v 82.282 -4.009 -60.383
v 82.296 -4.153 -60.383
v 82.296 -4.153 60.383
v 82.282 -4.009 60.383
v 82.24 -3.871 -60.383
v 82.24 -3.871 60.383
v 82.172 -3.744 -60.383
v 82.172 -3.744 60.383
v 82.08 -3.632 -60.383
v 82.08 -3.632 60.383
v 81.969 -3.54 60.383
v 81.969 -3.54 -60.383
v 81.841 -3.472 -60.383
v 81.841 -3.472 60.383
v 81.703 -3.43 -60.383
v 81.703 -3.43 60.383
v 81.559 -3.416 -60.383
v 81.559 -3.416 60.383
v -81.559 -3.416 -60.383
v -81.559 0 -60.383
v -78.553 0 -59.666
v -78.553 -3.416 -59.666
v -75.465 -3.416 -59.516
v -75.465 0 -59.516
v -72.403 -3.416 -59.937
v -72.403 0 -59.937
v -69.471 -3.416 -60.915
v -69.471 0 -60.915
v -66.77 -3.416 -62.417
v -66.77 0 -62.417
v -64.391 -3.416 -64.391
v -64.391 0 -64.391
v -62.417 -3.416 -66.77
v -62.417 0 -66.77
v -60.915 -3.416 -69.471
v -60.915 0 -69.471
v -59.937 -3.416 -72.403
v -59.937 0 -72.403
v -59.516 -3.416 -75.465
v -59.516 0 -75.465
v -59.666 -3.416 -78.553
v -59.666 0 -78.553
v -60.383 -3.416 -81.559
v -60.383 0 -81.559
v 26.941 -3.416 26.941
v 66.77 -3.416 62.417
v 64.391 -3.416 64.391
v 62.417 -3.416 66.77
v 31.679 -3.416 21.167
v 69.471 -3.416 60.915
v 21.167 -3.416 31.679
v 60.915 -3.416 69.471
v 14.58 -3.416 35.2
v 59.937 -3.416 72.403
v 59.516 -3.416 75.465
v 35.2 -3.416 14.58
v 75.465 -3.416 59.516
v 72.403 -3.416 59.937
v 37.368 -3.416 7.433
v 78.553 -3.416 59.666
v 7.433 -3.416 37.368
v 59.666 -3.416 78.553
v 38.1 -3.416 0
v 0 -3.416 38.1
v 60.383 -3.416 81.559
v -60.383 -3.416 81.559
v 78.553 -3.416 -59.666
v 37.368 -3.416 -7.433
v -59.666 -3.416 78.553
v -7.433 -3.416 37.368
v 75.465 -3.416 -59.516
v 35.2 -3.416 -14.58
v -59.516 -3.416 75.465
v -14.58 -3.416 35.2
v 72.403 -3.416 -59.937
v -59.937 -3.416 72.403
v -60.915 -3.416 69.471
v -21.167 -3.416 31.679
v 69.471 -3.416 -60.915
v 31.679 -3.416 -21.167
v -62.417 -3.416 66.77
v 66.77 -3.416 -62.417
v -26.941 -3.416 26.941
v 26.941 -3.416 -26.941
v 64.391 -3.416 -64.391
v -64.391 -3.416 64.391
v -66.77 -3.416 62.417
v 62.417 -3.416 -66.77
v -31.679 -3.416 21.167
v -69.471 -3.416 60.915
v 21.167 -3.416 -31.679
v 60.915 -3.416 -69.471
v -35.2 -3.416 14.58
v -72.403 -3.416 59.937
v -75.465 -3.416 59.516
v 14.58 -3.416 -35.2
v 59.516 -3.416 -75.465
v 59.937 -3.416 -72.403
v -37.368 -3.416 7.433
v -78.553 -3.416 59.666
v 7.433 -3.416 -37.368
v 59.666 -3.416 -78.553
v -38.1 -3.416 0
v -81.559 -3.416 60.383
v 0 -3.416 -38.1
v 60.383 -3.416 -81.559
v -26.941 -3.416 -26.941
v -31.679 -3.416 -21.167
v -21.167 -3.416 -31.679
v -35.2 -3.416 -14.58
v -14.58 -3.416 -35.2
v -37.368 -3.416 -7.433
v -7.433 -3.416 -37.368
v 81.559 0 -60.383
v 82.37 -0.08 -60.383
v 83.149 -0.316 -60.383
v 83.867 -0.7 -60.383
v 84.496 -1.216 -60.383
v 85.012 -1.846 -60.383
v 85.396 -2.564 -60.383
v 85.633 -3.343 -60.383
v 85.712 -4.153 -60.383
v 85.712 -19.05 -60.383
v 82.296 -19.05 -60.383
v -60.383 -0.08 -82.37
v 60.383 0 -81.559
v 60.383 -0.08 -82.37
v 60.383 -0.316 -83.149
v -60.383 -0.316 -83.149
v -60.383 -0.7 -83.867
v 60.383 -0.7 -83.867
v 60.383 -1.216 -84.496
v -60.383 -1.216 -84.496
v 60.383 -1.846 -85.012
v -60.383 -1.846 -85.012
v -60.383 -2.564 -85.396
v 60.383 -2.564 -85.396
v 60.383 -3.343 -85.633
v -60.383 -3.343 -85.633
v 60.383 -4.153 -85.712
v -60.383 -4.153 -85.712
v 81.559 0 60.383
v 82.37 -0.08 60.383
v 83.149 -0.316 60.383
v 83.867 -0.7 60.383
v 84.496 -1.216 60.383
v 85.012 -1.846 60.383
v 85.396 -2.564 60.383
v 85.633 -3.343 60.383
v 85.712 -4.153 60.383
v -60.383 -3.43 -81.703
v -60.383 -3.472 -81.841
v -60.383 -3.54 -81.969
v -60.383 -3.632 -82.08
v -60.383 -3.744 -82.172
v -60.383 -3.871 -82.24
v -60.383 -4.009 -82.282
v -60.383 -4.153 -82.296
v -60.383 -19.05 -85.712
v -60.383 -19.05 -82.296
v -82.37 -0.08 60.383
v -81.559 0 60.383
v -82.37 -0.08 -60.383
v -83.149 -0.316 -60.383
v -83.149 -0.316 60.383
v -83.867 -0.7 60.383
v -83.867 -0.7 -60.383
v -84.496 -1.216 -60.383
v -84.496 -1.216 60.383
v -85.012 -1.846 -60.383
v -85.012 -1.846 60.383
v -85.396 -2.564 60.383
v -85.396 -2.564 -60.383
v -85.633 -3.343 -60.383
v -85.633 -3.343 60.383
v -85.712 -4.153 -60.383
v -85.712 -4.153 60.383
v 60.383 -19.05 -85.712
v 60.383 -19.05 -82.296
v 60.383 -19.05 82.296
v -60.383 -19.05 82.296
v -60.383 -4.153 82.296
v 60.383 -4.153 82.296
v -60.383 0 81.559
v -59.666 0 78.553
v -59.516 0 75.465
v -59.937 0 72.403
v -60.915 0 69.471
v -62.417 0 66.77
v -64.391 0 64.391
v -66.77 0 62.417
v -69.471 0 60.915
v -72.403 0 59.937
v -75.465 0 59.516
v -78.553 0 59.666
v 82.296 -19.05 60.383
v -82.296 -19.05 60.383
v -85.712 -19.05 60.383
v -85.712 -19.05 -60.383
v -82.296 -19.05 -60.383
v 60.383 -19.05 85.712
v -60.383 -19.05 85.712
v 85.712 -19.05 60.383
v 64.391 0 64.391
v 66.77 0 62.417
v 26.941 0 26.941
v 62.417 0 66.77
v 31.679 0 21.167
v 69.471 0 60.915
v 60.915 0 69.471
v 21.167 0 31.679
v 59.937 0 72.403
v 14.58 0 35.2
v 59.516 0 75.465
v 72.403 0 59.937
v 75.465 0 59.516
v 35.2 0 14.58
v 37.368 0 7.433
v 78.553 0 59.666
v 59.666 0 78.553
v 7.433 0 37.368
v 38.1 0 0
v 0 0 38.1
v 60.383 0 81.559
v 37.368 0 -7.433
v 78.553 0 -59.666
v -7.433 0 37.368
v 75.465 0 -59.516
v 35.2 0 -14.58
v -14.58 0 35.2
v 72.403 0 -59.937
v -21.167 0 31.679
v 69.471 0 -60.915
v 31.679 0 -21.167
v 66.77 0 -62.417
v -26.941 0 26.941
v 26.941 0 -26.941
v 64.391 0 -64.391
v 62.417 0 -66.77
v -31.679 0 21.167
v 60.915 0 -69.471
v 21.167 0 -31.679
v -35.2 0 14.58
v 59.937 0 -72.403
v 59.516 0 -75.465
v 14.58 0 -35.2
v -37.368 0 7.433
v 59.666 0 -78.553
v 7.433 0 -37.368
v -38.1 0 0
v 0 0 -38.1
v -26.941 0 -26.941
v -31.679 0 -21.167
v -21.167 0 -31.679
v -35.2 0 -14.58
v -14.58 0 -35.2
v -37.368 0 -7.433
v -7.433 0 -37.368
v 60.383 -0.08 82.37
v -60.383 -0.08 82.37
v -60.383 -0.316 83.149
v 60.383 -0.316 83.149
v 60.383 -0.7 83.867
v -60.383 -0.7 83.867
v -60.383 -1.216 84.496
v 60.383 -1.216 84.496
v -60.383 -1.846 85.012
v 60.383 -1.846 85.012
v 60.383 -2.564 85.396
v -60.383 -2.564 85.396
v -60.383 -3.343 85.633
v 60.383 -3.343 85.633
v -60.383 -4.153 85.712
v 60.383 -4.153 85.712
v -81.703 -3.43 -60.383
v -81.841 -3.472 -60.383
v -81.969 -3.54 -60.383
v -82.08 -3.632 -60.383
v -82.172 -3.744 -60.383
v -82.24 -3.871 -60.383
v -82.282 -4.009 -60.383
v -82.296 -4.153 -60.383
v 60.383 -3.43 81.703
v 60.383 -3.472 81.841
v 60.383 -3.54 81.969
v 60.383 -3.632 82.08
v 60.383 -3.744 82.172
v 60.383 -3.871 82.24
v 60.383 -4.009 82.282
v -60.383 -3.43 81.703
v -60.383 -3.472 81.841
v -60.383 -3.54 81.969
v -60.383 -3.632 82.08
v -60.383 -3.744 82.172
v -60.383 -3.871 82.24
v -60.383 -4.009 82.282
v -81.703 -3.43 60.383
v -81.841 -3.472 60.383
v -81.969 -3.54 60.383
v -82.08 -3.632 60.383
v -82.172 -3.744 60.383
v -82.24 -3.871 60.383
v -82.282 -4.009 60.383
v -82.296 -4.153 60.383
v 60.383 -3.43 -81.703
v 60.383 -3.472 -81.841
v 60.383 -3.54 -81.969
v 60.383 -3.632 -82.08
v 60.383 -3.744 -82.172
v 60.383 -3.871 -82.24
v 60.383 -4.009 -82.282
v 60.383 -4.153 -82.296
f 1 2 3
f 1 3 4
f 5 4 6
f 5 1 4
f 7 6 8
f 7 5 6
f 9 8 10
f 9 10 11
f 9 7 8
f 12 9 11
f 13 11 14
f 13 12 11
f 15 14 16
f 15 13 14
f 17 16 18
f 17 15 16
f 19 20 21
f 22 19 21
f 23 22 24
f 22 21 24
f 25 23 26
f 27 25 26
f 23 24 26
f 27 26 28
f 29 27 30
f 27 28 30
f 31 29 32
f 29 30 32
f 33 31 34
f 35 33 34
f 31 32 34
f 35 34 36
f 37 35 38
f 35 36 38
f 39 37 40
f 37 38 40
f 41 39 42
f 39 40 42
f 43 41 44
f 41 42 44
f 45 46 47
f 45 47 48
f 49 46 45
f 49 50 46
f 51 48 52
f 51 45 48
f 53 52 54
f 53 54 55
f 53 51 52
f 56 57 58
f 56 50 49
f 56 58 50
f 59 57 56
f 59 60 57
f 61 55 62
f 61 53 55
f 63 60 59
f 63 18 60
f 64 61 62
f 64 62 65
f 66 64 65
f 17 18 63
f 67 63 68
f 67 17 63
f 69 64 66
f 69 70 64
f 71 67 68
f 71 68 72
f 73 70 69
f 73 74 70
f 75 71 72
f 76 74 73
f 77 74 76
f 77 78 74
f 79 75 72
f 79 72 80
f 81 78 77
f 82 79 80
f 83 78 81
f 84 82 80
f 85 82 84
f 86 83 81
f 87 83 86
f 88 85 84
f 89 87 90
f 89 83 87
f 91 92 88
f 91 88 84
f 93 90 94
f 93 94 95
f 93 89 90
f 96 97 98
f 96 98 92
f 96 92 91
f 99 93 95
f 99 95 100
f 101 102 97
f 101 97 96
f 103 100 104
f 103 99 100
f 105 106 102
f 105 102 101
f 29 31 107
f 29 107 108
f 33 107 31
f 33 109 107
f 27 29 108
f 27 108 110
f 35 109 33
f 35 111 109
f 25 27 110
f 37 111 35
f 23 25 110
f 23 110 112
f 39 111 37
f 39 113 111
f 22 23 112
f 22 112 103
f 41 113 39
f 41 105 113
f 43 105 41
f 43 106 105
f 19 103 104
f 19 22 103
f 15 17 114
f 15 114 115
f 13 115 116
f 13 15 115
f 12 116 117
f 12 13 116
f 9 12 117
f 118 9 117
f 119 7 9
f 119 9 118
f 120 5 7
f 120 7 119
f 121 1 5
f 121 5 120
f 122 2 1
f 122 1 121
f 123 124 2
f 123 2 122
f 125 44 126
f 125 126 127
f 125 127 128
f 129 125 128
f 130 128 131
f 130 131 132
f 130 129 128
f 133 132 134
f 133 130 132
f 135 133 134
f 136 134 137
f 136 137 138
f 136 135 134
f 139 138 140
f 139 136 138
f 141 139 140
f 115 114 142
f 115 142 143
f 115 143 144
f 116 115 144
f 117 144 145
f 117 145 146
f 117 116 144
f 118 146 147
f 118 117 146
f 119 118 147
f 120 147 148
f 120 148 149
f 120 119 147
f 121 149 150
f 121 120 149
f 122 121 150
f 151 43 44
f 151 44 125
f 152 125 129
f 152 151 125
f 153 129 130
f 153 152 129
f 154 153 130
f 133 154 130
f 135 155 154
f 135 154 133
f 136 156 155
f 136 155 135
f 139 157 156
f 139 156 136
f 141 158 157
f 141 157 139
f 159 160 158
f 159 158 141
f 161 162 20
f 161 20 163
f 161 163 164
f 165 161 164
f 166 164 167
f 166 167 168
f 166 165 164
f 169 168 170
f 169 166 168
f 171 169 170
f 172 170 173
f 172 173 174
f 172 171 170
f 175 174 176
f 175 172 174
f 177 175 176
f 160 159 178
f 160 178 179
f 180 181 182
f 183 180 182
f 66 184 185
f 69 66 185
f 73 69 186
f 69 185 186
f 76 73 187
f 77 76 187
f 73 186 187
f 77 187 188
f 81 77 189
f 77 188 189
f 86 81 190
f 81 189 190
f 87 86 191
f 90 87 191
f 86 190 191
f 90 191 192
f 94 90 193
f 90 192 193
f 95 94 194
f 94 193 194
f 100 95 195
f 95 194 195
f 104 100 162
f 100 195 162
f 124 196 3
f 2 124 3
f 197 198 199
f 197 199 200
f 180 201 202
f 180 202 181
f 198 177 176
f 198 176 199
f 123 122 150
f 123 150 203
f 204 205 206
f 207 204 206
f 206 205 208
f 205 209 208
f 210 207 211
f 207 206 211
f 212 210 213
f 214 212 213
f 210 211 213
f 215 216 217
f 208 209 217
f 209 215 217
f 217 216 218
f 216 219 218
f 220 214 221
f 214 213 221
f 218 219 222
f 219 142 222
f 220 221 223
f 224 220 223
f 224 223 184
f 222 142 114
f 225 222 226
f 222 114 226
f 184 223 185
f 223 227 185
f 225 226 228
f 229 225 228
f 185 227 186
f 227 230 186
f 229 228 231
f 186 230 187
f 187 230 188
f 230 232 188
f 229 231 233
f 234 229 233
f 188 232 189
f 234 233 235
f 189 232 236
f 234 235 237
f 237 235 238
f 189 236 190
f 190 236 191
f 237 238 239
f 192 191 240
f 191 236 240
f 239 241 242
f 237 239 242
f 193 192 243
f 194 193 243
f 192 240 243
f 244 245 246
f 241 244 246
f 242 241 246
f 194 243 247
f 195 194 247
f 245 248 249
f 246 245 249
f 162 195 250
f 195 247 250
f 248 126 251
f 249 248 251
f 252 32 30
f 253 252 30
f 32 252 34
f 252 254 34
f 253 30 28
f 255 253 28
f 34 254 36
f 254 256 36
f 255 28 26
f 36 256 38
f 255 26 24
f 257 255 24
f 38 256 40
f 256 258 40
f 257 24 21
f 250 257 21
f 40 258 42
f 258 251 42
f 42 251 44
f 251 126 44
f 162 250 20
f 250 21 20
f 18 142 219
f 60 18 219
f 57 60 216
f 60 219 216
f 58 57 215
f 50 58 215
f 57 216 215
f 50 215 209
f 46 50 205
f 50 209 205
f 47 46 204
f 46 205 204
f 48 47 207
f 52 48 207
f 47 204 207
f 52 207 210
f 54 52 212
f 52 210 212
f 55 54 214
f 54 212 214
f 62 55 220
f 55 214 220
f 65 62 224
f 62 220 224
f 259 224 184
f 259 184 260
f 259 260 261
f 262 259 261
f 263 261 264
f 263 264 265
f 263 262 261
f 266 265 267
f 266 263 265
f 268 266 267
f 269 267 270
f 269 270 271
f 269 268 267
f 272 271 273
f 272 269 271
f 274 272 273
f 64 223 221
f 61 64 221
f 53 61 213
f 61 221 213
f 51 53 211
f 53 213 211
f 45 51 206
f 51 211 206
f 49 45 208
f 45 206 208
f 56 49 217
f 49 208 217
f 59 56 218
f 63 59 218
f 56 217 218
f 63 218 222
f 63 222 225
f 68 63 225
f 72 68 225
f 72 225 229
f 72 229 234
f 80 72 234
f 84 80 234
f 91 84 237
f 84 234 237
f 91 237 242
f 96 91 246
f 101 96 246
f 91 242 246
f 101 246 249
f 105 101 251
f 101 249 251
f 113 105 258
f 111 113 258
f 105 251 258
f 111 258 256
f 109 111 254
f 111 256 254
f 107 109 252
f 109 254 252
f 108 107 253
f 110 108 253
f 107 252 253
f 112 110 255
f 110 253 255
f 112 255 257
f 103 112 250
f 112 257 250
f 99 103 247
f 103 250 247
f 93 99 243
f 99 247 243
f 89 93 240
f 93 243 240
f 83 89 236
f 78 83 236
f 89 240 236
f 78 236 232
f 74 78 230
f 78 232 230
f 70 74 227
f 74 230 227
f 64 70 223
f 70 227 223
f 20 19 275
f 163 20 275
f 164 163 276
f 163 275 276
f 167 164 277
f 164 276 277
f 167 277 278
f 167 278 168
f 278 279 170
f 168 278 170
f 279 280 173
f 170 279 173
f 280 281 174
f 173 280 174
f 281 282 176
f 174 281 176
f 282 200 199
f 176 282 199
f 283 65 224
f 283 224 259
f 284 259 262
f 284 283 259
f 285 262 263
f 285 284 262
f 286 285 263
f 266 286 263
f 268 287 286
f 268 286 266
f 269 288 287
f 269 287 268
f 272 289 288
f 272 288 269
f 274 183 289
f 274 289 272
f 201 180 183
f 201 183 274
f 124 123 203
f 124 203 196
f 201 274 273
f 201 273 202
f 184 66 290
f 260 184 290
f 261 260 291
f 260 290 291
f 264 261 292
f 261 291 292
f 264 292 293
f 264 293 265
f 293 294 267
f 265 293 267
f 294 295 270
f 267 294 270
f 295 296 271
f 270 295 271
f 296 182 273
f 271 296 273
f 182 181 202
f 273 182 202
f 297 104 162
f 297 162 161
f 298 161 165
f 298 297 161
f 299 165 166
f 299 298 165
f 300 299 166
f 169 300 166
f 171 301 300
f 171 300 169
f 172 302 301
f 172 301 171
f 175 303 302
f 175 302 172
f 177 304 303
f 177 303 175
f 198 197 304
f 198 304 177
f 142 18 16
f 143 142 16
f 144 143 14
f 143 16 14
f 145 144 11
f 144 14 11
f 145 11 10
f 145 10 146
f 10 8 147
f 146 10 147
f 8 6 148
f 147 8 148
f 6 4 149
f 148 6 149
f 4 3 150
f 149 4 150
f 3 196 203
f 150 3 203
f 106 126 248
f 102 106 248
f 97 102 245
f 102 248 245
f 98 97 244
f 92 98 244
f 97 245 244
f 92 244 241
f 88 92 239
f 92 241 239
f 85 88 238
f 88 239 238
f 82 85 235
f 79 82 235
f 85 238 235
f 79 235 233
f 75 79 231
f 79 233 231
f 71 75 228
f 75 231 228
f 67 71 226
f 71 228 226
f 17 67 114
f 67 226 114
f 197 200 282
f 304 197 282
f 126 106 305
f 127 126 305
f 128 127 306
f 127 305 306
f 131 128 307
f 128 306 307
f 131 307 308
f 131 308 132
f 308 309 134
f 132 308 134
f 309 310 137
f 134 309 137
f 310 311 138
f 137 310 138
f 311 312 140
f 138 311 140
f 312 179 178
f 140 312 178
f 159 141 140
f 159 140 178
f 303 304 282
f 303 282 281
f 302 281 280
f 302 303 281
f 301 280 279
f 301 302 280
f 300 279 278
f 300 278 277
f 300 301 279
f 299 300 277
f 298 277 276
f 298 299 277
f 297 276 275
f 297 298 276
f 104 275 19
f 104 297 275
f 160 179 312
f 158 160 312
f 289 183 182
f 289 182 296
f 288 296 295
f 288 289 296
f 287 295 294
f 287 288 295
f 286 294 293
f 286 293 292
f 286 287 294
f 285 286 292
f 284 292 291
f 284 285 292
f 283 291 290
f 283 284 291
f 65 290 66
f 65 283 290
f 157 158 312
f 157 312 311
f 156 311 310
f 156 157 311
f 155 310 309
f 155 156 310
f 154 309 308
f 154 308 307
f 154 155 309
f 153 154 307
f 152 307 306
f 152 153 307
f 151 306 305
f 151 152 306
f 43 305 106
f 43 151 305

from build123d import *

# Parameters (mm, degrees)
SKETCH3_R                 = 38.1
BASE_FLANGE1_DEPTH        = 3.4163
EDGE_FLANGE1_DEPTH        = 120.765617952
EDGE_FLANGE1_BEND_DEPTH   = 120.765617952
EDGE_FLANGE1_BEND_2_DEPTH = 120.765617952
EDGE_FLANGE1_BEND_3_DEPTH = 120.765617952


# Sheet-metal steps are written as plain solids
with BuildPart() as part:
    # Sketch3 → Base-Flange1 (new body)
    with BuildSketch(Plane(origin=(0, 0, 0), x_dir=(1, 0, 0), z_dir=(0, 1, 0))):
        with BuildLine():
            Line((-60.382808976, 81.5594), (60.382808976, 81.5594))
            ThreePointArc((60.382808976, 81.5594), (64.390963201, 64.390963201), (81.5594, 60.382808976))
            Line((81.5594, 60.382808976), (81.5594, -60.382808976))
            ThreePointArc((81.5594, -60.382808976), (64.390963201, -64.390963201), (60.382808976, -81.5594))
            Line((60.382808976, -81.5594), (-60.382808976, -81.5594))
            ThreePointArc((-60.382808976, -81.5594), (-64.390963201, -64.390963201), (-81.5594, -60.382808976))
            Line((-81.5594, -60.382808976), (-81.5594, 60.382808976))
            ThreePointArc((-81.5594, 60.382808976), (-64.390963201, 64.390963201), (-60.382808976, 81.5594))
        make_face()
        with Locations(Location((0, 0, 0), (0, 0, 270))):
            Circle(SKETCH3_R, mode=Mode.SUBTRACT)
    extrude(amount=-BASE_FLANGE1_DEPTH)

    # Edge-Flange1 section (across the edge) → Edge-Flange1 (add)
    with BuildSketch(Plane(origin=(60.382808976, -3.4163, 82.296), x_dir=(0, 0, -1), z_dir=(-1, 0, 0))):
        with BuildLine():
            Line((-3.4163, 0.7366), (-3.4163, 15.6337))
            Line((-3.4163, 15.6337), (0, 15.6337))
            Line((0, 15.6337), (0, 0.7366))
            ThreePointArc((0, 0.7366), (0.215745145, 0.215745145), (0.7366, 0))
            Line((0.7366, 0), (0.7366, -3.4163))
            ThreePointArc((0.7366, -3.4163), (-2.199943752, -2.199943752), (-3.4163, 0.7366))
        make_face()
    extrude(amount=EDGE_FLANGE1_DEPTH)

    # Edge-Flange1 section 2 (across the edge) → Edge-Flange1 bend (add)
    with BuildSketch(Plane(origin=(82.296, -3.4163, -60.382808976), x_dir=(-1, 0, 0), z_dir=(0, 0, 1))):
        with BuildLine():
            Line((-3.4163, 0.7366), (-3.4163, 15.6337))
            Line((-3.4163, 15.6337), (0, 15.6337))
            Line((0, 15.6337), (0, 0.7366))
            ThreePointArc((0, 0.7366), (0.215745145, 0.215745145), (0.7366, 0))
            Line((0.7366, 0), (0.7366, -3.4163))
            ThreePointArc((0.7366, -3.4163), (-2.199943752, -2.199943752), (-3.4163, 0.7366))
        make_face()
    extrude(amount=EDGE_FLANGE1_BEND_DEPTH)

    # Edge-Flange1 section 3 (across the edge) → Edge-Flange1 bend 2 (add)
    with BuildSketch(Plane(origin=(-60.382808976, -3.4163, -82.296), x_dir=(0, 0, 1), z_dir=(1, 0, 0))):
        with BuildLine():
            Line((-3.4163, 0.7366), (-3.4163, 15.6337))
            Line((-3.4163, 15.6337), (0, 15.6337))
            Line((0, 15.6337), (0, 0.7366))
            ThreePointArc((0, 0.7366), (0.215745145, 0.215745145), (0.7366, 0))
            Line((0.7366, 0), (0.7366, -3.4163))
            ThreePointArc((0.7366, -3.4163), (-2.199943752, -2.199943752), (-3.4163, 0.7366))
        make_face()
    extrude(amount=EDGE_FLANGE1_BEND_2_DEPTH)

    # Edge-Flange1 section 4 (across the edge) → Edge-Flange1 bend 3 (add)
    with BuildSketch(Plane(origin=(-82.296, -3.4163, 60.382808976), x_dir=(1, 0, 0), z_dir=(0, 0, -1))):
        with BuildLine():
            Line((-3.4163, 0.7366), (-3.4163, 15.6337))
            Line((-3.4163, 15.6337), (0, 15.6337))
            Line((0, 15.6337), (0, 0.7366))
            ThreePointArc((0, 0.7366), (0.215745145, 0.215745145), (0.7366, 0))
            Line((0.7366, 0), (0.7366, -3.4163))
            ThreePointArc((0.7366, -3.4163), (-2.199943752, -2.199943752), (-3.4163, 0.7366))
        make_face()
    extrude(amount=EDGE_FLANGE1_BEND_3_DEPTH)


solid = part.part
